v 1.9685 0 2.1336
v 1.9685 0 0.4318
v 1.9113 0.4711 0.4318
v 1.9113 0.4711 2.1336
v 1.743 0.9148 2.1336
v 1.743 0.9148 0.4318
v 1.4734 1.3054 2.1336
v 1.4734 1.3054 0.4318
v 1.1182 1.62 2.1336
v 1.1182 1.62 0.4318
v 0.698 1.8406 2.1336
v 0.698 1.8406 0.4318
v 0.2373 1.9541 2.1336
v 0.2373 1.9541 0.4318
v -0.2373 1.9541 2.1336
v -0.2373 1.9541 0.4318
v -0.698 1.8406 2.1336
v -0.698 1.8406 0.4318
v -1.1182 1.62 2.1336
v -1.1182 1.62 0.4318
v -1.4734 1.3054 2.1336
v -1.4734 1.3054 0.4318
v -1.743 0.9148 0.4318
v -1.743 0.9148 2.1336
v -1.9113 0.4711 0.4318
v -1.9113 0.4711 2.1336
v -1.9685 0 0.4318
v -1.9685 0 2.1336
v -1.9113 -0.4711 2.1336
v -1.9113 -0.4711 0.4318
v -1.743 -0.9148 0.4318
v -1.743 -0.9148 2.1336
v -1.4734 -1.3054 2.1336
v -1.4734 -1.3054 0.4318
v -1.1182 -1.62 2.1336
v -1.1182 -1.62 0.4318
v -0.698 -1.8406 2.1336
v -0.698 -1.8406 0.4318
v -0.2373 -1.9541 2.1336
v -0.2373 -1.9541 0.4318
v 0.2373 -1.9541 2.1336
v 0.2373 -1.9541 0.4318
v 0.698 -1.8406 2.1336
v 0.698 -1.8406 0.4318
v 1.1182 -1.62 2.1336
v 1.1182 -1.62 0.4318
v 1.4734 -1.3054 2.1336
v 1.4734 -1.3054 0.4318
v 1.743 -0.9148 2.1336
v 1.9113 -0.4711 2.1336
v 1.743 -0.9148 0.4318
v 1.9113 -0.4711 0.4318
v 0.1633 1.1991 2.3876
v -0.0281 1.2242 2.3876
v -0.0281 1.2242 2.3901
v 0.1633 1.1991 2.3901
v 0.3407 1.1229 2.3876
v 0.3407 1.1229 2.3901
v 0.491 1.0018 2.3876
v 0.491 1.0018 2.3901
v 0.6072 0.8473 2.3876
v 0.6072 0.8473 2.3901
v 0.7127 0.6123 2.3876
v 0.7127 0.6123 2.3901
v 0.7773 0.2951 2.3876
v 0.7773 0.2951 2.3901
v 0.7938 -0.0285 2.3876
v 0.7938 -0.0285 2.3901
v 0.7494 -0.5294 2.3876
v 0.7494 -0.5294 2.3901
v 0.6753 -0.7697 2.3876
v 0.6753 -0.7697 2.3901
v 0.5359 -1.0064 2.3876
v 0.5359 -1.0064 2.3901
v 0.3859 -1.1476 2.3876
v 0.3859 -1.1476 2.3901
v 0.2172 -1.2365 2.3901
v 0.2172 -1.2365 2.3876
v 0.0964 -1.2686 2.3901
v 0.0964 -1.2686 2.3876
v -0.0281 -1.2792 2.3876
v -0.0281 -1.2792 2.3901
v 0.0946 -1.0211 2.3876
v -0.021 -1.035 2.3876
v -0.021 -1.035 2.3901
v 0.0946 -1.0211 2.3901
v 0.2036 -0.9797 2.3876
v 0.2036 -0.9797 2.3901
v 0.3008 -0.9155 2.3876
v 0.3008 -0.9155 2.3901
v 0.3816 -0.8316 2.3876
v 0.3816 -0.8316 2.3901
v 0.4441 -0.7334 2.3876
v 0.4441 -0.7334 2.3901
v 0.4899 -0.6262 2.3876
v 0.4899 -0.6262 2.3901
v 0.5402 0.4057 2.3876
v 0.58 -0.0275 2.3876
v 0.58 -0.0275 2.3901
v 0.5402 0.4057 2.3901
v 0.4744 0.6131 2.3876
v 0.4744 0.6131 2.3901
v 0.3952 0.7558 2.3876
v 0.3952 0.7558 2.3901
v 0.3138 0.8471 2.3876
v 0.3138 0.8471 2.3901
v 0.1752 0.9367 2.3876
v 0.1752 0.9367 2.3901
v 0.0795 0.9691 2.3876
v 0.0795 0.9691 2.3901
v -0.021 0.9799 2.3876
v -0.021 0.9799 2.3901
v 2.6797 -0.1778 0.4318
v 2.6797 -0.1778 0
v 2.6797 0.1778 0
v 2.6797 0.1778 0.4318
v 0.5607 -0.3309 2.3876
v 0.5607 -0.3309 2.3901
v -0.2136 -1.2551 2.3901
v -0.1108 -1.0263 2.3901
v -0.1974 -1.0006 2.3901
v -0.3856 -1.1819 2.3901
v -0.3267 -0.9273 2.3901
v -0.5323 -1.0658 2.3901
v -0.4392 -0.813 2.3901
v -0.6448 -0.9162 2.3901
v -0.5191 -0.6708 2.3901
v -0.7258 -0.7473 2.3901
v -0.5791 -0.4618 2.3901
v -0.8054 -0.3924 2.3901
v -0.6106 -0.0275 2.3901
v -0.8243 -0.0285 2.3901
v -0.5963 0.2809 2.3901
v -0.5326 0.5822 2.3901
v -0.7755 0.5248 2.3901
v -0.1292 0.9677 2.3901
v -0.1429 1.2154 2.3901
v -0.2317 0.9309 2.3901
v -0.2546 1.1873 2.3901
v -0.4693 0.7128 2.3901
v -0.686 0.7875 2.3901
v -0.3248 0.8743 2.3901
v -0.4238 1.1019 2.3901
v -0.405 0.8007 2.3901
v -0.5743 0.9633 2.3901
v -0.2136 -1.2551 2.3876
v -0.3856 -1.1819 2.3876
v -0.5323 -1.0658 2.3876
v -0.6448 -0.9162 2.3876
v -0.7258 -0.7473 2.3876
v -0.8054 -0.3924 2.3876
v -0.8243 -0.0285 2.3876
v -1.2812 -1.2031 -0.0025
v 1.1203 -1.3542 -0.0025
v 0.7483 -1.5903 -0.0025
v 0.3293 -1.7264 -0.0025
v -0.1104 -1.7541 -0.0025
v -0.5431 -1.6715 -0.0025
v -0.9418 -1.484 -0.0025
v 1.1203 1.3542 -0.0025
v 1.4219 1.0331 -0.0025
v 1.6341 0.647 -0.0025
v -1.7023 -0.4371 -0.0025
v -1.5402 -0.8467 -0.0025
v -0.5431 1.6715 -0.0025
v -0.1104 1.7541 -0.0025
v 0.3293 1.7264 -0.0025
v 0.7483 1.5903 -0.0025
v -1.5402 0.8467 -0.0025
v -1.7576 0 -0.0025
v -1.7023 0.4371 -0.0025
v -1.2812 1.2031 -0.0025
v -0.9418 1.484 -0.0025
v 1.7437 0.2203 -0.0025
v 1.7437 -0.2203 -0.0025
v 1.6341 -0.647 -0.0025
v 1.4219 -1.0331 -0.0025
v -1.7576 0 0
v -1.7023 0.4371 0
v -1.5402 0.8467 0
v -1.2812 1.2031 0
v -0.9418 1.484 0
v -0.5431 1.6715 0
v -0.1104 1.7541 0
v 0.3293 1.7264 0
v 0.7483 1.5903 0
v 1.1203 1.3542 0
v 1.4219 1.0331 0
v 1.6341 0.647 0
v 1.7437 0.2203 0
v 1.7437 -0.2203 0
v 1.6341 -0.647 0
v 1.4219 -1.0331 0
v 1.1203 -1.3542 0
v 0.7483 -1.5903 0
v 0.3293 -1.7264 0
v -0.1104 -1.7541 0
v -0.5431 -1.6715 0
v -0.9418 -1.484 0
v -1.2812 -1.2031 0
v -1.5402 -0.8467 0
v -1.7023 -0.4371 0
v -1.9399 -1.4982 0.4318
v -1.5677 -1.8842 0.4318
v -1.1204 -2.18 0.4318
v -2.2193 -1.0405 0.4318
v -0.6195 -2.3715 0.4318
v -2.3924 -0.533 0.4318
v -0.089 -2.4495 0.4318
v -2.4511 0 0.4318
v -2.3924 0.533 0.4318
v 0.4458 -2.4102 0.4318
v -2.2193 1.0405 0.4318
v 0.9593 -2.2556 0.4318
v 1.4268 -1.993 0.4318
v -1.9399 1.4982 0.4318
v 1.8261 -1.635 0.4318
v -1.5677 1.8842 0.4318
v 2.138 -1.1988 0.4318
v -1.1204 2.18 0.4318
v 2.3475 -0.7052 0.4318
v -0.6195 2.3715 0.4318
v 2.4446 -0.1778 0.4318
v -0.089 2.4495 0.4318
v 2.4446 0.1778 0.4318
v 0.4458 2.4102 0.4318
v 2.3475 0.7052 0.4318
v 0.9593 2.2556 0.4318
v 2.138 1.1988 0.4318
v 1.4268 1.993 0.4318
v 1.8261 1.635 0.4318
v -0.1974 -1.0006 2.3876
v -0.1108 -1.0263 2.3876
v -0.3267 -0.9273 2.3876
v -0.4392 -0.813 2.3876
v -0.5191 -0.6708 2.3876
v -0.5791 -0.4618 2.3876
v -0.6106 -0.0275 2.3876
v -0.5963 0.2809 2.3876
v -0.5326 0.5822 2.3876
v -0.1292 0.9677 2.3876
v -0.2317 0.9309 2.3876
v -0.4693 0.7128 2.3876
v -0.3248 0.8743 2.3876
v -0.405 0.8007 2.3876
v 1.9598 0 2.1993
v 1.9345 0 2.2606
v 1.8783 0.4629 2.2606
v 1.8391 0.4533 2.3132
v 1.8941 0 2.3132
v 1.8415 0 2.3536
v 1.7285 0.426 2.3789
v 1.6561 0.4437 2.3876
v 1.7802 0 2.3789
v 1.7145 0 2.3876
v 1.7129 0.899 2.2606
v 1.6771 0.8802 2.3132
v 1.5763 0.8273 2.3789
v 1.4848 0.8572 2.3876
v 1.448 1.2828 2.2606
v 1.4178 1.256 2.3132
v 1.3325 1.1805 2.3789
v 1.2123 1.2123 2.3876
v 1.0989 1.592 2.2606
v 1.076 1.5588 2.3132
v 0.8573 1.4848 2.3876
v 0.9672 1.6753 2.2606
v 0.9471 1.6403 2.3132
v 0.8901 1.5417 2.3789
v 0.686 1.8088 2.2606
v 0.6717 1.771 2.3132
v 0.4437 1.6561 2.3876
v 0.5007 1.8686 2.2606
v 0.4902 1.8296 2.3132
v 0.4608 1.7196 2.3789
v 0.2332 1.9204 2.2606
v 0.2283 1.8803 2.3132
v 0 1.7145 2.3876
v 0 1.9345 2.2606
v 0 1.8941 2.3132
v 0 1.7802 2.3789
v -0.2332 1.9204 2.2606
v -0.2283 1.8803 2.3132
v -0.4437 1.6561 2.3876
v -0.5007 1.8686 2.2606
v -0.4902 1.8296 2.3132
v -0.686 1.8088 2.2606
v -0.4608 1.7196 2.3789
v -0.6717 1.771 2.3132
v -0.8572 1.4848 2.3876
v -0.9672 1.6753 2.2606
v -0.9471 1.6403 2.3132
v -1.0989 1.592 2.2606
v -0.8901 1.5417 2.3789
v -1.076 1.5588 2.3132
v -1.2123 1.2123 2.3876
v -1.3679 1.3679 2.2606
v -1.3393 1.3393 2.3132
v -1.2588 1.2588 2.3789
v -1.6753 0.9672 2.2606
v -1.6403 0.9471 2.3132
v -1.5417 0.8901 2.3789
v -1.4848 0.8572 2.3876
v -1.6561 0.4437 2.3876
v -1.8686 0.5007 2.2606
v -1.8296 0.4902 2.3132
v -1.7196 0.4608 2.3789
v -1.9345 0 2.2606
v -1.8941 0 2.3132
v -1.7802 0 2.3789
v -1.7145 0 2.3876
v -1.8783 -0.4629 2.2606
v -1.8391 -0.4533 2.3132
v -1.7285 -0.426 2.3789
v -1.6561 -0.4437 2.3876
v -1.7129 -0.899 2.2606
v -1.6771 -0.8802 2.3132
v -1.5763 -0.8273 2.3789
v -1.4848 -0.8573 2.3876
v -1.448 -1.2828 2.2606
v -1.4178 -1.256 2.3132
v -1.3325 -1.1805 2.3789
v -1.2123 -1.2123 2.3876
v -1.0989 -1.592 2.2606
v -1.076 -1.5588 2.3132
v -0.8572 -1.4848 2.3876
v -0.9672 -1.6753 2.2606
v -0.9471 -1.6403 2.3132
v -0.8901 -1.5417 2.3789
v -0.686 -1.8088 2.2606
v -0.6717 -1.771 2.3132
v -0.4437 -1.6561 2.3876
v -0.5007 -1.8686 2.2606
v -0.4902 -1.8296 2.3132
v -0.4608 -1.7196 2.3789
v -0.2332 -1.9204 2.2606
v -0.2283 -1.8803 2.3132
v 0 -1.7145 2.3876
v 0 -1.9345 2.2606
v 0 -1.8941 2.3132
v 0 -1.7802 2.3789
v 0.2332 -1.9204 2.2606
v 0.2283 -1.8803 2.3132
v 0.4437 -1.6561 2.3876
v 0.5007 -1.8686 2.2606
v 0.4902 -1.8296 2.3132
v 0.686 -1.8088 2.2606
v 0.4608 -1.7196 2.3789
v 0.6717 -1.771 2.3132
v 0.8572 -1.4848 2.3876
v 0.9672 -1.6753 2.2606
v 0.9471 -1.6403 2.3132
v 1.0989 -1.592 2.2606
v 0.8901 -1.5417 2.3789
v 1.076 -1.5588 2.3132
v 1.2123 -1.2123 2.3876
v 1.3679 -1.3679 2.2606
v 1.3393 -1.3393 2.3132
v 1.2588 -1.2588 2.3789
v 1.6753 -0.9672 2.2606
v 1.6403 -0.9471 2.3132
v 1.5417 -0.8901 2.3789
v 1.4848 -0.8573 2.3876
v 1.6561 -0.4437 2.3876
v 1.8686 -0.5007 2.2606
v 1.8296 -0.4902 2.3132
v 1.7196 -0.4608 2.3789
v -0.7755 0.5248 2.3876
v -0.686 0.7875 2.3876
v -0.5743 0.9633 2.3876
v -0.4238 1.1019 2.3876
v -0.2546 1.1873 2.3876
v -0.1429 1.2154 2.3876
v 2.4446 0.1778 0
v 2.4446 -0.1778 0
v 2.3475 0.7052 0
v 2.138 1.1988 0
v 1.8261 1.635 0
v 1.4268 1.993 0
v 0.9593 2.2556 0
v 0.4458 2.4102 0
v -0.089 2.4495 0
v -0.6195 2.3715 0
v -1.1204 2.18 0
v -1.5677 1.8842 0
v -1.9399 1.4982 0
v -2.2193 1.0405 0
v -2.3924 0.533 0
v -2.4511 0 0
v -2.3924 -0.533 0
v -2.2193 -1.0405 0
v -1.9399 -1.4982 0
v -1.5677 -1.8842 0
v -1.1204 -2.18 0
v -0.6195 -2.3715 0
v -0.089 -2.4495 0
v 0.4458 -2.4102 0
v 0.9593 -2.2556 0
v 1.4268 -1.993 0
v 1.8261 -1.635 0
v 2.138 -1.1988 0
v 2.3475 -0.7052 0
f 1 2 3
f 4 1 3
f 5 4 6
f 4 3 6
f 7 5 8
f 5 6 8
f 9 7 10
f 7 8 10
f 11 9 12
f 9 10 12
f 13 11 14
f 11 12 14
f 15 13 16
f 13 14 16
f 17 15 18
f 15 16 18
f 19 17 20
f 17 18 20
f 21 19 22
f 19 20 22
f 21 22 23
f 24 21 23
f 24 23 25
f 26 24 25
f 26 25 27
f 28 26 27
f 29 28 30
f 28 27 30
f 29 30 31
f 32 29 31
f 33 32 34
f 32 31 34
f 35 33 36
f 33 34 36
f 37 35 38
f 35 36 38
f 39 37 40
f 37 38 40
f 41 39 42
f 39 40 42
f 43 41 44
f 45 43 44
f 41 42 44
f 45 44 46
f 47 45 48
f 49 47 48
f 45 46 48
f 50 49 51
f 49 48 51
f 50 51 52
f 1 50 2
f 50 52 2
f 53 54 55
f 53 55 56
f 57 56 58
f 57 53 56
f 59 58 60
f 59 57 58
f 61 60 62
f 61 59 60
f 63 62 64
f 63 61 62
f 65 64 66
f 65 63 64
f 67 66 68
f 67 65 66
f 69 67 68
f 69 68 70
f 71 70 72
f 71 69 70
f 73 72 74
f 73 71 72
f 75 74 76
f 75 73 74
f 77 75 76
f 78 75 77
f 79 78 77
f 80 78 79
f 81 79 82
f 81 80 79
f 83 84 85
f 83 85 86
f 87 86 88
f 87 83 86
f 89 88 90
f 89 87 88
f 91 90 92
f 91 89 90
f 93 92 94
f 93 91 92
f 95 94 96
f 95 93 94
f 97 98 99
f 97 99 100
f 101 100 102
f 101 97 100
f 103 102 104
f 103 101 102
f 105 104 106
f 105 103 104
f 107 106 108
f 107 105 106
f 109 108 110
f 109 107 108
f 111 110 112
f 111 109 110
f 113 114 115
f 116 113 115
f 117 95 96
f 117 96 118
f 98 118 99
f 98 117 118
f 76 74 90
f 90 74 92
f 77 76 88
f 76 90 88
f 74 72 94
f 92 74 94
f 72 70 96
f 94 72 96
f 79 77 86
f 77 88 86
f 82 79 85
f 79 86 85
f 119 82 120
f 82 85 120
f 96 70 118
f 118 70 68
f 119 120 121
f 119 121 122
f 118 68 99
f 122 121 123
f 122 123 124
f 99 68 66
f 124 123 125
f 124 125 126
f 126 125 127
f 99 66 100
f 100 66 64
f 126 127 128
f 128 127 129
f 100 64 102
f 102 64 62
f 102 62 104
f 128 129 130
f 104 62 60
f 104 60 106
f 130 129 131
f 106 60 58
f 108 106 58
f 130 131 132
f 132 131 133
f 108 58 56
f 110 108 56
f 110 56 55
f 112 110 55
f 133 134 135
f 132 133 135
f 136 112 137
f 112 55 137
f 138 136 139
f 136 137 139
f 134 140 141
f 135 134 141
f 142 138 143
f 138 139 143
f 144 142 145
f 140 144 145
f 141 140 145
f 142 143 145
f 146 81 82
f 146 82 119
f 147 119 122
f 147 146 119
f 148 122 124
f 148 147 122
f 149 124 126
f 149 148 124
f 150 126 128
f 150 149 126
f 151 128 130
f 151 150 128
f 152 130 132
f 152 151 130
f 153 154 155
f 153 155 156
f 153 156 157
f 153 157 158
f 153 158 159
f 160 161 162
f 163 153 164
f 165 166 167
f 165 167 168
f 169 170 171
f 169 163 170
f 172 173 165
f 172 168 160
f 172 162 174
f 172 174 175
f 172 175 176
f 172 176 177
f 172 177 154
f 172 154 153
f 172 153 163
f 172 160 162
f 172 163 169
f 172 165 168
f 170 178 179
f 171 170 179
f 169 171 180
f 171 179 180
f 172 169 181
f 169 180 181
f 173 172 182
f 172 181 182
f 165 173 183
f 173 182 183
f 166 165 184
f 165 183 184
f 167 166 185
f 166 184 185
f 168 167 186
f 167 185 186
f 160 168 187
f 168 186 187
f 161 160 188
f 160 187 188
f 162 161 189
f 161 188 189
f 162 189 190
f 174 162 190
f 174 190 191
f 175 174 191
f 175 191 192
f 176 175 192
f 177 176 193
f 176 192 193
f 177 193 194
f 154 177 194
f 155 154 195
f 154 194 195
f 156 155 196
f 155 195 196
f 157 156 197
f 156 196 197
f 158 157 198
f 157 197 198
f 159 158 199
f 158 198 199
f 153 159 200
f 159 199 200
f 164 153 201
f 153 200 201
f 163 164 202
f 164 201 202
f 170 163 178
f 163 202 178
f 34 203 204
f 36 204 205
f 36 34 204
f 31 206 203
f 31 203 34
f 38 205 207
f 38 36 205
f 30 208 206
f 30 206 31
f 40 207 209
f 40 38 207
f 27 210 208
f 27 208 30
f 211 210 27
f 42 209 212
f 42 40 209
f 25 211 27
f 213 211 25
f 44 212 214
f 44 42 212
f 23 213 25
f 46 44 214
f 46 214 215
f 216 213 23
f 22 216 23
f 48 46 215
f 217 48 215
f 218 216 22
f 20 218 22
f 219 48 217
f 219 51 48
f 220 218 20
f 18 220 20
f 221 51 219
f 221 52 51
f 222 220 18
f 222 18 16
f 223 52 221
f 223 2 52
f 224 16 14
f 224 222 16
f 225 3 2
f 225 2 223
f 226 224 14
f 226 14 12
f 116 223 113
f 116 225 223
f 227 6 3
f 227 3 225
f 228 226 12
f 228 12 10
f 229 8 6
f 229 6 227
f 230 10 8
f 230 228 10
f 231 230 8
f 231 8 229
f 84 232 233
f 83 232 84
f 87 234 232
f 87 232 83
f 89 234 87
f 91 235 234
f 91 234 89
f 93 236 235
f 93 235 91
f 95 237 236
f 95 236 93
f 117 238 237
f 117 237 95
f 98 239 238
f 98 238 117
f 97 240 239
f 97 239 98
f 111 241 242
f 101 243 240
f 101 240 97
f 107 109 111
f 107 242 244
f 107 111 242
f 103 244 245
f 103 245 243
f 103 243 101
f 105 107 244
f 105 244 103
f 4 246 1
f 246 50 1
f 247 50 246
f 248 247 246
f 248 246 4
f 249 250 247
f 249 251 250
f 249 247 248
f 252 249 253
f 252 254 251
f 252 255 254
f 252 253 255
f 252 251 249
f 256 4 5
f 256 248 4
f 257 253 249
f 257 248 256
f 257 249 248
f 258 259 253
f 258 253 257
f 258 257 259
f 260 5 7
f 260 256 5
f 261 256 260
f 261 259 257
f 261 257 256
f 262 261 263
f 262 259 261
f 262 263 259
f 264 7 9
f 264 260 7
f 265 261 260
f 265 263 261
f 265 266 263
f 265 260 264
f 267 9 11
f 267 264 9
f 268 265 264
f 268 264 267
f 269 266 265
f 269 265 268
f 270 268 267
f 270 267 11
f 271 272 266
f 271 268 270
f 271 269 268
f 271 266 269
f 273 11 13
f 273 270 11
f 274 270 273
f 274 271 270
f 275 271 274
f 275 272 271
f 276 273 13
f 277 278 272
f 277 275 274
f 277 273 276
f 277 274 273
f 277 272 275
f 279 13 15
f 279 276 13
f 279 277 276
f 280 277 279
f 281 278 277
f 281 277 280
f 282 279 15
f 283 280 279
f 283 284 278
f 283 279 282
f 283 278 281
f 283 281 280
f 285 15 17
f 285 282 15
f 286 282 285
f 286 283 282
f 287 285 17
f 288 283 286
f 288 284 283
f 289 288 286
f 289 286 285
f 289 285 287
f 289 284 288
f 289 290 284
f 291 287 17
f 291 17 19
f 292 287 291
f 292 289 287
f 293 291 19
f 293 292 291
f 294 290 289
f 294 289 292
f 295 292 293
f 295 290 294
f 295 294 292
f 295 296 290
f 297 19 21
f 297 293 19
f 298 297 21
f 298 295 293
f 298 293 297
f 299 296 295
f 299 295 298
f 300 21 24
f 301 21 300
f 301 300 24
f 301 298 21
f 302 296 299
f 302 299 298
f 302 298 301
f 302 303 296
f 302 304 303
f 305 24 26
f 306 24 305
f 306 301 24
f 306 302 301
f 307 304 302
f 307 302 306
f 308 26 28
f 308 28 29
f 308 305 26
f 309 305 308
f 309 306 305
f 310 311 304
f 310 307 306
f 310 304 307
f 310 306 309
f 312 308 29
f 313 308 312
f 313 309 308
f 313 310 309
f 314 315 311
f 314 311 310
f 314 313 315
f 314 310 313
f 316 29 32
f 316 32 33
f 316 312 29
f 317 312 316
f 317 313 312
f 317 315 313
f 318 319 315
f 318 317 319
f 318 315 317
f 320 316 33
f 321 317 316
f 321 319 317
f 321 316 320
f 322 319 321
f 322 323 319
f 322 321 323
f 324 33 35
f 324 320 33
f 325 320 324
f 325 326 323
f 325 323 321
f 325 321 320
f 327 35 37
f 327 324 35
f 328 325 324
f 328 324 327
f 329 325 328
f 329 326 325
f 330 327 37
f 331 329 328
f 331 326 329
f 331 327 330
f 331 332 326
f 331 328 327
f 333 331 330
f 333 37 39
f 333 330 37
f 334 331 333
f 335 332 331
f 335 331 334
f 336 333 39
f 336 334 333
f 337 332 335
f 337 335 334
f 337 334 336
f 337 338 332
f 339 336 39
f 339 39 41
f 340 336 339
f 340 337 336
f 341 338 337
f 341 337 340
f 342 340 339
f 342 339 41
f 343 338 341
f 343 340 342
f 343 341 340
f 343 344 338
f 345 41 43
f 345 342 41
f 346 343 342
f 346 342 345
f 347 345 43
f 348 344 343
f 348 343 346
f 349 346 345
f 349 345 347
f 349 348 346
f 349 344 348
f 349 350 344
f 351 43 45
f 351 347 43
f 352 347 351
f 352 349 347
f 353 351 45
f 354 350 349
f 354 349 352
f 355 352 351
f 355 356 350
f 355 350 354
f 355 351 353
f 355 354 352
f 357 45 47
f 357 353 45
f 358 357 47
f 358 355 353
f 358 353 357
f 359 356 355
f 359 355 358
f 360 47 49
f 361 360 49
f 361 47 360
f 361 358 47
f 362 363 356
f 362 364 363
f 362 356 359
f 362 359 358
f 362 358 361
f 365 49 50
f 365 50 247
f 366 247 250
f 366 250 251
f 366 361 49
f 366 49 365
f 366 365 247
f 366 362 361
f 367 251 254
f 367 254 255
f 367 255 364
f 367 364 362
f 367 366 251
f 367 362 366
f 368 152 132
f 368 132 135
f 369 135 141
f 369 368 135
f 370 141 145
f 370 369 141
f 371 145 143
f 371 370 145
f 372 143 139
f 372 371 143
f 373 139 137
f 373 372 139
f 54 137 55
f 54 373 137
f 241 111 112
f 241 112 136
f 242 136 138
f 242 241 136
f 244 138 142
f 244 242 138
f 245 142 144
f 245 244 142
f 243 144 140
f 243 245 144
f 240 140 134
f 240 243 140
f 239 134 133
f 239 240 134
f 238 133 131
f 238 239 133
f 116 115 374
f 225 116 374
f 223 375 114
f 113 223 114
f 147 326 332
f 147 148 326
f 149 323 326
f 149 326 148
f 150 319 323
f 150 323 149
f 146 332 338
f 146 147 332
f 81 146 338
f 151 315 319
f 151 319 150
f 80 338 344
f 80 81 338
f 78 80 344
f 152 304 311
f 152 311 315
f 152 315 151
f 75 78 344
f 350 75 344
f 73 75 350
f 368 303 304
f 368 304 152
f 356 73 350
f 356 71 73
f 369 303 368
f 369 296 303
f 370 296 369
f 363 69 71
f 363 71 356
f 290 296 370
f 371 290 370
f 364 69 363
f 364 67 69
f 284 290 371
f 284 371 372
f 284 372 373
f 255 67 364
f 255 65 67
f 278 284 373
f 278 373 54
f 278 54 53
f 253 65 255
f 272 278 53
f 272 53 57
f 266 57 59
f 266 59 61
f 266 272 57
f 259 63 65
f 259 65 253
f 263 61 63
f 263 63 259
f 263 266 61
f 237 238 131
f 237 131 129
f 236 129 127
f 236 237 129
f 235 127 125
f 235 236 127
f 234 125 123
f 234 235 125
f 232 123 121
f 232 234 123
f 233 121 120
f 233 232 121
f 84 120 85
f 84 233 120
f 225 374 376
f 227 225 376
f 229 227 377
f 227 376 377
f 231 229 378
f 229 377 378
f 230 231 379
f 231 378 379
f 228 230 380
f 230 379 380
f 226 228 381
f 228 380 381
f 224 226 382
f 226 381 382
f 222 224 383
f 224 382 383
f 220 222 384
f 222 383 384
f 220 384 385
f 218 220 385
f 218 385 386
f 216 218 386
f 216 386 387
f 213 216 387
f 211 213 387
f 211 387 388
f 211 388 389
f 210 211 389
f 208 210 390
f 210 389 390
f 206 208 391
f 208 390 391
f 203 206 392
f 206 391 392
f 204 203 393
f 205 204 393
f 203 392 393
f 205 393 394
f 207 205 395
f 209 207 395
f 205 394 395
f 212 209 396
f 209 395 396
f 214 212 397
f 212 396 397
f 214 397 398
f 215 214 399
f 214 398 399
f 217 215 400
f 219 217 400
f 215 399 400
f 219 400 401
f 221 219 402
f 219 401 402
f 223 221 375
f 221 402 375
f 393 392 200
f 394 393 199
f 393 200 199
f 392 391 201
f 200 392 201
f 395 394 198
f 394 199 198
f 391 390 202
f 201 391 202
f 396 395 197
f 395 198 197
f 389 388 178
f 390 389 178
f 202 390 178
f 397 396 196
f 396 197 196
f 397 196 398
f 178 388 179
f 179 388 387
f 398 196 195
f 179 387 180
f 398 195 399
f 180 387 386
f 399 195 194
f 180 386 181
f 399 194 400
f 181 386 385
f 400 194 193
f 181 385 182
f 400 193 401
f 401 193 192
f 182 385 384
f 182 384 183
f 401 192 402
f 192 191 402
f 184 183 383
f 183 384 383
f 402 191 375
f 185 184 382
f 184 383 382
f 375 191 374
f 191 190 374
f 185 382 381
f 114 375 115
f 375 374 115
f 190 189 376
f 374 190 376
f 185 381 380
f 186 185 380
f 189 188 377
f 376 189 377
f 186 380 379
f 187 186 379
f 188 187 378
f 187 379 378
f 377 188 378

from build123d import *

# Parameters (mm, degrees)
BOSS_EXTRUDE1_DEPTH = 0.4318
SKETCH2_R           = 1.9685
BOSS_EXTRUDE2_DEPTH = 1.9558
SKETCH3_R           = 1.757566481
BOSS_EXTRUDE3_DEPTH = 0.00254
FILLET1_R           = 0.254
BOSS_EXTRUDE6_DEPTH = 0.00254


with BuildPart() as part:
    # Sketch1 → Boss-Extrude1 (new body)
    with BuildSketch(Plane.XY):
        with BuildLine():
            Line((2.6797, 0.1778), (2.4511, 0.1778))
            Line((2.4511, 0.1778), (2.44464279, 0.1778))
            ThreePointArc((2.44464279, 0.1778), (-2.4511, 0), (2.44464279, -0.1778))
            Line((2.44464279, -0.1778), (2.4511, -0.1778))
            Line((2.4511, -0.1778), (2.6797, -0.1778))
            Line((2.6797, -0.1778), (2.6797, 0.1778))
        make_face()
    extrude(amount=BOSS_EXTRUDE1_DEPTH)

    # Sketch2 → Boss-Extrude2 (add)
    with BuildSketch(Plane.XY.offset(0.4318)):
        Circle(SKETCH2_R)
    extrude(amount=BOSS_EXTRUDE2_DEPTH)

    # Sketch3 → Boss-Extrude3 (add)
    with BuildSketch(Plane(origin=(0, 0, 0), x_dir=(-1, 0, 0), z_dir=(0, 0, -1))):
        Circle(SKETCH3_R)
    extrude(amount=BOSS_EXTRUDE3_DEPTH)

    # Fillet1
    fillet1_edges = [part.edges().sort_by_distance(p)[0] for p in [
        (-1.9685, 0, 2.3876),
    ]]
    fillet(fillet1_edges, radius=FILLET1_R)

    # Sketch4 → Boss-Extrude6 (add)
    with BuildSketch(Plane.XY.offset(2.3876)):
        with BuildLine():
            add(Edge.make_bspline(
                [(-0.824278846, -0.028470233), (-0.824055677, 0.009696025), (-0.823622167, 0.083834532), (-0.818799509, 0.191864798), (-0.810788071, 0.293210994), (-0.799808894, 0.387877973), (-0.786448054, 0.475890174), (-0.76861216, 0.557012392), (-0.748328807, 0.631620089), (-0.724820804, 0.699956554), (-0.698295183, 0.762942456), (-0.66942473, 0.821742459), (-0.637063683, 0.876267595), (-0.603061533, 0.927388127), (-0.566041892, 0.974267248), (-0.52705825, 1.017566988), (-0.484589081, 1.056286624), (-0.44007807, 1.091560626), (-0.393122225, 1.122482499), (-0.345059983, 1.149719058), (-0.295560527, 1.172987182), (-0.244488713, 1.191282282), (-0.19230358, 1.206393591), (-0.138822701, 1.2167275), (-0.083957773, 1.22322961), (-0.046924957, 1.223851231), (-0.02814378, 1.224166485)],
                knots=[0, 0, 0, 0, 0.000114492, 0.000222403, 0.000324329, 0.000419413, 0.000508267, 0.000591258, 0.000668447, 0.000740102, 0.000807875, 0.000873367, 0.000936443, 0.000997963, 0.001057413, 0.001115492, 0.001172544, 0.00122961, 0.001285706, 0.001341027, 0.001395232, 0.001449558, 0.001503614, 0.00155806, 0.001612792, 0.001669112, 0.001669112, 0.001669112, 0.001669112], degree=3))
            add(Edge.make_bspline(
                [(-0.02814378, 1.224166485), (-0.009205713, 1.223834597), (0.028456143, 1.223174575), (0.084136826, 1.216830964), (0.138531164, 1.206305075), (0.191407254, 1.191390983), (0.243199433, 1.17288821), (0.293502596, 1.149696797), (0.342629199, 1.122700996), (0.389798556, 1.090980108), (0.435528499, 1.055613595), (0.478695774, 1.015633994), (0.519304309, 0.971444988), (0.557863758, 0.923519363), (0.593280156, 0.870937904), (0.627007794, 0.814615143), (0.657196626, 0.753566108), (0.686271467, 0.688809397), (0.711367792, 0.618553229), (0.73400072, 0.543193633), (0.752288018, 0.461840481), (0.76752072, 0.374920607), (0.779321443, 0.282114802), (0.787916152, 0.183622005), (0.792456233, 0.079377418), (0.793311238, 0.008104667), (0.79375, -0.028470233)],
                knots=[0, 0, 0, 0, 5.6797e-05, 0.000112951, 0.000167865, 0.00022284, 0.000277613, 0.000332685, 0.000388839, 0.000445596, 0.000503038, 0.000562112, 0.000621861, 0.000682948, 0.000746456, 0.000811902, 0.00087974, 0.000950647, 0.001024738, 0.00110337, 0.001186569, 0.001274717, 0.001368023, 0.001467137, 0.001571235, 0.001680965, 0.001680965, 0.001680965, 0.001680965], degree=3))
            add(Edge.make_bspline(
                [(0.79375, -0.028470233), (0.79330669, -0.064885606), (0.792442918, -0.135839476), (0.787967048, -0.239615014), (0.779150551, -0.337585112), (0.768121969, -0.42998473), (0.752847296, -0.516429288), (0.734065924, -0.597217922), (0.713212758, -0.672699514), (0.687471586, -0.742255698), (0.659297513, -0.806856781), (0.628643889, -0.867182109), (0.595803168, -0.92376489), (0.560024039, -0.976152218), (0.521887699, -1.024715197), (0.480577918, -1.068596615), (0.437259181, -1.108853805), (0.391394662, -1.144675715), (0.34348966, -1.176029841), (0.294531788, -1.204069979), (0.243652379, -1.22668008), (0.192004459, -1.246094099), (0.138849268, -1.260926192), (0.084253062, -1.271181798), (0.028493552, -1.27837443), (-0.009199299, -1.278923125), (-0.02814378, -1.279198899)],
                knots=[0, 0, 0, 0, 0.000109253, 0.000212874, 0.000311514, 0.000404286, 0.000491965, 0.000574698, 0.000653064, 0.000726706, 0.000796984, 0.000864397, 0.000929602, 0.000993109, 0.00105457, 0.001114643, 0.001173717, 0.001231829, 0.001288983, 0.00134537, 0.001400876, 0.001455813, 0.001510787, 0.00156617, 0.001622379, 0.001679176, 0.001679176, 0.001679176, 0.001679176], degree=3))
            add(Edge.make_bspline(
                [(-0.02814378, -1.279198899), (-0.046924436, -1.278881611), (-0.083956224, -1.27825598), (-0.138828678, -1.271783245), (-0.192088698, -1.26137684), (-0.2439991, -1.246805901), (-0.294826211, -1.22897045), (-0.343877435, -1.205733747), (-0.391698162, -1.178972532), (-0.43816081, -1.148495647), (-0.482392298, -1.113578574), (-0.524641528, -1.074958584), (-0.563847121, -1.031671942), (-0.600337461, -0.984402141), (-0.635018046, -0.93358406), (-0.666919566, -0.878523863), (-0.696427237, -0.819439873), (-0.723398969, -0.755950366), (-0.747312613, -0.687128888), (-0.768436143, -0.612188108), (-0.785114525, -0.530466577), (-0.799390429, -0.442620654), (-0.810905054, -0.348272855), (-0.818766121, -0.247371959), (-0.823624766, -0.139980844), (-0.824056841, -0.066318729), (-0.824278846, -0.028470233)],
                knots=[0, 0, 0, 0, 5.632e-05, 0.000111052, 0.000165498, 0.000218966, 0.000272681, 0.000326886, 0.000381558, 0.000436992, 0.000493389, 0.000550441, 0.000608519, 0.000668346, 0.000729471, 0.000792958, 0.00085909, 0.000927487, 0.00099975, 0.001077526, 0.001160884, 0.001249813, 0.001344479, 0.001445931, 0.001553365, 0.001666903, 0.001666903, 0.001666903, 0.001666903], degree=3))
        make_face()
        with BuildLine():
            add(Edge.make_bspline(
                [(-0.610576923, -0.027516207), (-0.610495656, -0.059322018), (-0.610337934, -0.121050852), (-0.606217554, -0.210751356), (-0.60060445, -0.294415098), (-0.593364568, -0.372148308), (-0.582612919, -0.44368787), (-0.570565979, -0.509525815), (-0.555905582, -0.569313721), (-0.538559865, -0.623461856), (-0.518802908, -0.672889169), (-0.497231597, -0.718882139), (-0.474058141, -0.761984081), (-0.448123505, -0.80180784), (-0.419878435, -0.838483283), (-0.389960914, -0.87265955), (-0.357254388, -0.903137496), (-0.312008092, -0.939690945), (-0.252275133, -0.977463785), (-0.177013716, -1.010356392), (-0.099678574, -1.031027313), (-0.04718817, -1.033656047), (-0.020988582, -1.03496813)],
                knots=[0, 0, 0, 0, 9.5407e-05, 0.000185167, 0.000269316, 0.000346968, 0.000419286, 0.000486272, 0.000547705, 0.000603822, 0.000656704, 0.000707279, 0.00075616, 0.000803394, 0.000849667, 0.000894946, 0.00093949, 0.000983592, 0.001069348, 0.001150525, 0.001229313, 0.001307828, 0.001307828, 0.001307828, 0.001307828], degree=3))
            add(Edge.make_bspline(
                [(-0.020988582, -1.03496813), (0.005380477, -1.033881068), (0.058064152, -1.03170919), (0.135035538, -1.010755049), (0.209759347, -0.979139166), (0.268319006, -0.941755238), (0.312870522, -0.906153285), (0.344790832, -0.87579939), (0.374088404, -0.841811559), (0.401875601, -0.805140788), (0.427361151, -0.765086473), (0.45053625, -0.721841221), (0.471684027, -0.675284941), (0.483732503, -0.642784458), (0.489892578, -0.626167799)],
                knots=[0, 0, 0, 0, 7.8951e-05, 0.000157739, 0.000237661, 0.000321698, 0.00036513, 0.000408653, 0.000453617, 0.000499601, 0.000546577, 0.000595878, 0.000646686, 0.000699838, 0.000699838, 0.000699838, 0.000699838], degree=3))
            add(Edge.make_bspline(
                [(0.489892578, -0.626167799), (0.497071549, -0.604920423), (0.511647938, -0.561779137), (0.530433806, -0.494856724), (0.545228443, -0.424641986), (0.558538519, -0.351554541), (0.567623366, -0.275055387), (0.574935717, -0.195381222), (0.579242845, -0.112471974), (0.579776756, -0.05614181), (0.580048077, -0.027516207)],
                knots=[0, 0, 0, 0, 6.7277e-05, 0.000136602, 0.000208365, 0.000282476, 0.000359392, 0.000439374, 0.000522485, 0.00060836, 0.00060836, 0.00060836, 0.00060836], degree=3))
            add(Edge.make_bspline(
                [(0.580048077, -0.027516207), (0.579673752, 0.001104767), (0.578941492, 0.057093509), (0.576142511, 0.139088914), (0.568914686, 0.216967873), (0.560887071, 0.291065891), (0.549050748, 0.360972793), (0.53628874, 0.427273804), (0.519142915, 0.489147541), (0.500827854, 0.547562721), (0.479865781, 0.601855666), (0.456790969, 0.65227951), (0.432147237, 0.699077689), (0.405380462, 0.742121804), (0.376808399, 0.781604659), (0.345676924, 0.816734625), (0.313220913, 0.84860049), (0.267761364, 0.884974131), (0.208247606, 0.922061553), (0.134193692, 0.956192186), (0.0571292, 0.975792113), (0.005031904, 0.978555511), (-0.020988582, 0.979935716)],
                knots=[0, 0, 0, 0, 8.5874e-05, 0.000167988, 0.000246028, 0.000320462, 0.000391511, 0.00045868, 0.0005229, 0.000583997, 0.000642286, 0.000697358, 0.000750279, 0.000800842, 0.00084931, 0.000896293, 0.000941496, 0.000985598, 0.001070697, 0.001151193, 0.001229402, 0.001307441, 0.001307441, 0.001307441, 0.001307441], degree=3))
            add(Edge.make_bspline(
                [(-0.020988582, 0.979935716), (-0.04732561, 0.978553607), (-0.100047645, 0.975786871), (-0.177913128, 0.956265211), (-0.252551268, 0.922238532), (-0.311907649, 0.884851293), (-0.357398903, 0.849242549), (-0.38943195, 0.818363551), (-0.419467114, 0.784586367), (-0.447135674, 0.747573635), (-0.47304999, 0.707796305), (-0.496849572, 0.664941449), (-0.518292612, 0.618791896), (-0.538080484, 0.569386785), (-0.555479113, 0.515243322), (-0.569830542, 0.45552906), (-0.583088697, 0.389900523), (-0.592474407, 0.3179735), (-0.600818141, 0.240220821), (-0.606180272, 0.156348217), (-0.610351717, 0.066497272), (-0.610500351, 0.004449274), (-0.610576923, -0.027516207)],
                knots=[0, 0, 0, 0, 7.899e-05, 0.000158124, 0.000239056, 0.000324154, 0.000367959, 0.000412157, 0.000457436, 0.00050342, 0.000550654, 0.000599765, 0.00065034, 0.000703222, 0.000759339, 0.000820772, 0.00088738, 0.000960102, 0.001038277, 0.00112195, 0.001212187, 0.001308071, 0.001308071, 0.001308071, 0.001308071], degree=3))
        make_face(mode=Mode.SUBTRACT)
    extrude(amount=BOSS_EXTRUDE6_DEPTH)


solid = part.part
